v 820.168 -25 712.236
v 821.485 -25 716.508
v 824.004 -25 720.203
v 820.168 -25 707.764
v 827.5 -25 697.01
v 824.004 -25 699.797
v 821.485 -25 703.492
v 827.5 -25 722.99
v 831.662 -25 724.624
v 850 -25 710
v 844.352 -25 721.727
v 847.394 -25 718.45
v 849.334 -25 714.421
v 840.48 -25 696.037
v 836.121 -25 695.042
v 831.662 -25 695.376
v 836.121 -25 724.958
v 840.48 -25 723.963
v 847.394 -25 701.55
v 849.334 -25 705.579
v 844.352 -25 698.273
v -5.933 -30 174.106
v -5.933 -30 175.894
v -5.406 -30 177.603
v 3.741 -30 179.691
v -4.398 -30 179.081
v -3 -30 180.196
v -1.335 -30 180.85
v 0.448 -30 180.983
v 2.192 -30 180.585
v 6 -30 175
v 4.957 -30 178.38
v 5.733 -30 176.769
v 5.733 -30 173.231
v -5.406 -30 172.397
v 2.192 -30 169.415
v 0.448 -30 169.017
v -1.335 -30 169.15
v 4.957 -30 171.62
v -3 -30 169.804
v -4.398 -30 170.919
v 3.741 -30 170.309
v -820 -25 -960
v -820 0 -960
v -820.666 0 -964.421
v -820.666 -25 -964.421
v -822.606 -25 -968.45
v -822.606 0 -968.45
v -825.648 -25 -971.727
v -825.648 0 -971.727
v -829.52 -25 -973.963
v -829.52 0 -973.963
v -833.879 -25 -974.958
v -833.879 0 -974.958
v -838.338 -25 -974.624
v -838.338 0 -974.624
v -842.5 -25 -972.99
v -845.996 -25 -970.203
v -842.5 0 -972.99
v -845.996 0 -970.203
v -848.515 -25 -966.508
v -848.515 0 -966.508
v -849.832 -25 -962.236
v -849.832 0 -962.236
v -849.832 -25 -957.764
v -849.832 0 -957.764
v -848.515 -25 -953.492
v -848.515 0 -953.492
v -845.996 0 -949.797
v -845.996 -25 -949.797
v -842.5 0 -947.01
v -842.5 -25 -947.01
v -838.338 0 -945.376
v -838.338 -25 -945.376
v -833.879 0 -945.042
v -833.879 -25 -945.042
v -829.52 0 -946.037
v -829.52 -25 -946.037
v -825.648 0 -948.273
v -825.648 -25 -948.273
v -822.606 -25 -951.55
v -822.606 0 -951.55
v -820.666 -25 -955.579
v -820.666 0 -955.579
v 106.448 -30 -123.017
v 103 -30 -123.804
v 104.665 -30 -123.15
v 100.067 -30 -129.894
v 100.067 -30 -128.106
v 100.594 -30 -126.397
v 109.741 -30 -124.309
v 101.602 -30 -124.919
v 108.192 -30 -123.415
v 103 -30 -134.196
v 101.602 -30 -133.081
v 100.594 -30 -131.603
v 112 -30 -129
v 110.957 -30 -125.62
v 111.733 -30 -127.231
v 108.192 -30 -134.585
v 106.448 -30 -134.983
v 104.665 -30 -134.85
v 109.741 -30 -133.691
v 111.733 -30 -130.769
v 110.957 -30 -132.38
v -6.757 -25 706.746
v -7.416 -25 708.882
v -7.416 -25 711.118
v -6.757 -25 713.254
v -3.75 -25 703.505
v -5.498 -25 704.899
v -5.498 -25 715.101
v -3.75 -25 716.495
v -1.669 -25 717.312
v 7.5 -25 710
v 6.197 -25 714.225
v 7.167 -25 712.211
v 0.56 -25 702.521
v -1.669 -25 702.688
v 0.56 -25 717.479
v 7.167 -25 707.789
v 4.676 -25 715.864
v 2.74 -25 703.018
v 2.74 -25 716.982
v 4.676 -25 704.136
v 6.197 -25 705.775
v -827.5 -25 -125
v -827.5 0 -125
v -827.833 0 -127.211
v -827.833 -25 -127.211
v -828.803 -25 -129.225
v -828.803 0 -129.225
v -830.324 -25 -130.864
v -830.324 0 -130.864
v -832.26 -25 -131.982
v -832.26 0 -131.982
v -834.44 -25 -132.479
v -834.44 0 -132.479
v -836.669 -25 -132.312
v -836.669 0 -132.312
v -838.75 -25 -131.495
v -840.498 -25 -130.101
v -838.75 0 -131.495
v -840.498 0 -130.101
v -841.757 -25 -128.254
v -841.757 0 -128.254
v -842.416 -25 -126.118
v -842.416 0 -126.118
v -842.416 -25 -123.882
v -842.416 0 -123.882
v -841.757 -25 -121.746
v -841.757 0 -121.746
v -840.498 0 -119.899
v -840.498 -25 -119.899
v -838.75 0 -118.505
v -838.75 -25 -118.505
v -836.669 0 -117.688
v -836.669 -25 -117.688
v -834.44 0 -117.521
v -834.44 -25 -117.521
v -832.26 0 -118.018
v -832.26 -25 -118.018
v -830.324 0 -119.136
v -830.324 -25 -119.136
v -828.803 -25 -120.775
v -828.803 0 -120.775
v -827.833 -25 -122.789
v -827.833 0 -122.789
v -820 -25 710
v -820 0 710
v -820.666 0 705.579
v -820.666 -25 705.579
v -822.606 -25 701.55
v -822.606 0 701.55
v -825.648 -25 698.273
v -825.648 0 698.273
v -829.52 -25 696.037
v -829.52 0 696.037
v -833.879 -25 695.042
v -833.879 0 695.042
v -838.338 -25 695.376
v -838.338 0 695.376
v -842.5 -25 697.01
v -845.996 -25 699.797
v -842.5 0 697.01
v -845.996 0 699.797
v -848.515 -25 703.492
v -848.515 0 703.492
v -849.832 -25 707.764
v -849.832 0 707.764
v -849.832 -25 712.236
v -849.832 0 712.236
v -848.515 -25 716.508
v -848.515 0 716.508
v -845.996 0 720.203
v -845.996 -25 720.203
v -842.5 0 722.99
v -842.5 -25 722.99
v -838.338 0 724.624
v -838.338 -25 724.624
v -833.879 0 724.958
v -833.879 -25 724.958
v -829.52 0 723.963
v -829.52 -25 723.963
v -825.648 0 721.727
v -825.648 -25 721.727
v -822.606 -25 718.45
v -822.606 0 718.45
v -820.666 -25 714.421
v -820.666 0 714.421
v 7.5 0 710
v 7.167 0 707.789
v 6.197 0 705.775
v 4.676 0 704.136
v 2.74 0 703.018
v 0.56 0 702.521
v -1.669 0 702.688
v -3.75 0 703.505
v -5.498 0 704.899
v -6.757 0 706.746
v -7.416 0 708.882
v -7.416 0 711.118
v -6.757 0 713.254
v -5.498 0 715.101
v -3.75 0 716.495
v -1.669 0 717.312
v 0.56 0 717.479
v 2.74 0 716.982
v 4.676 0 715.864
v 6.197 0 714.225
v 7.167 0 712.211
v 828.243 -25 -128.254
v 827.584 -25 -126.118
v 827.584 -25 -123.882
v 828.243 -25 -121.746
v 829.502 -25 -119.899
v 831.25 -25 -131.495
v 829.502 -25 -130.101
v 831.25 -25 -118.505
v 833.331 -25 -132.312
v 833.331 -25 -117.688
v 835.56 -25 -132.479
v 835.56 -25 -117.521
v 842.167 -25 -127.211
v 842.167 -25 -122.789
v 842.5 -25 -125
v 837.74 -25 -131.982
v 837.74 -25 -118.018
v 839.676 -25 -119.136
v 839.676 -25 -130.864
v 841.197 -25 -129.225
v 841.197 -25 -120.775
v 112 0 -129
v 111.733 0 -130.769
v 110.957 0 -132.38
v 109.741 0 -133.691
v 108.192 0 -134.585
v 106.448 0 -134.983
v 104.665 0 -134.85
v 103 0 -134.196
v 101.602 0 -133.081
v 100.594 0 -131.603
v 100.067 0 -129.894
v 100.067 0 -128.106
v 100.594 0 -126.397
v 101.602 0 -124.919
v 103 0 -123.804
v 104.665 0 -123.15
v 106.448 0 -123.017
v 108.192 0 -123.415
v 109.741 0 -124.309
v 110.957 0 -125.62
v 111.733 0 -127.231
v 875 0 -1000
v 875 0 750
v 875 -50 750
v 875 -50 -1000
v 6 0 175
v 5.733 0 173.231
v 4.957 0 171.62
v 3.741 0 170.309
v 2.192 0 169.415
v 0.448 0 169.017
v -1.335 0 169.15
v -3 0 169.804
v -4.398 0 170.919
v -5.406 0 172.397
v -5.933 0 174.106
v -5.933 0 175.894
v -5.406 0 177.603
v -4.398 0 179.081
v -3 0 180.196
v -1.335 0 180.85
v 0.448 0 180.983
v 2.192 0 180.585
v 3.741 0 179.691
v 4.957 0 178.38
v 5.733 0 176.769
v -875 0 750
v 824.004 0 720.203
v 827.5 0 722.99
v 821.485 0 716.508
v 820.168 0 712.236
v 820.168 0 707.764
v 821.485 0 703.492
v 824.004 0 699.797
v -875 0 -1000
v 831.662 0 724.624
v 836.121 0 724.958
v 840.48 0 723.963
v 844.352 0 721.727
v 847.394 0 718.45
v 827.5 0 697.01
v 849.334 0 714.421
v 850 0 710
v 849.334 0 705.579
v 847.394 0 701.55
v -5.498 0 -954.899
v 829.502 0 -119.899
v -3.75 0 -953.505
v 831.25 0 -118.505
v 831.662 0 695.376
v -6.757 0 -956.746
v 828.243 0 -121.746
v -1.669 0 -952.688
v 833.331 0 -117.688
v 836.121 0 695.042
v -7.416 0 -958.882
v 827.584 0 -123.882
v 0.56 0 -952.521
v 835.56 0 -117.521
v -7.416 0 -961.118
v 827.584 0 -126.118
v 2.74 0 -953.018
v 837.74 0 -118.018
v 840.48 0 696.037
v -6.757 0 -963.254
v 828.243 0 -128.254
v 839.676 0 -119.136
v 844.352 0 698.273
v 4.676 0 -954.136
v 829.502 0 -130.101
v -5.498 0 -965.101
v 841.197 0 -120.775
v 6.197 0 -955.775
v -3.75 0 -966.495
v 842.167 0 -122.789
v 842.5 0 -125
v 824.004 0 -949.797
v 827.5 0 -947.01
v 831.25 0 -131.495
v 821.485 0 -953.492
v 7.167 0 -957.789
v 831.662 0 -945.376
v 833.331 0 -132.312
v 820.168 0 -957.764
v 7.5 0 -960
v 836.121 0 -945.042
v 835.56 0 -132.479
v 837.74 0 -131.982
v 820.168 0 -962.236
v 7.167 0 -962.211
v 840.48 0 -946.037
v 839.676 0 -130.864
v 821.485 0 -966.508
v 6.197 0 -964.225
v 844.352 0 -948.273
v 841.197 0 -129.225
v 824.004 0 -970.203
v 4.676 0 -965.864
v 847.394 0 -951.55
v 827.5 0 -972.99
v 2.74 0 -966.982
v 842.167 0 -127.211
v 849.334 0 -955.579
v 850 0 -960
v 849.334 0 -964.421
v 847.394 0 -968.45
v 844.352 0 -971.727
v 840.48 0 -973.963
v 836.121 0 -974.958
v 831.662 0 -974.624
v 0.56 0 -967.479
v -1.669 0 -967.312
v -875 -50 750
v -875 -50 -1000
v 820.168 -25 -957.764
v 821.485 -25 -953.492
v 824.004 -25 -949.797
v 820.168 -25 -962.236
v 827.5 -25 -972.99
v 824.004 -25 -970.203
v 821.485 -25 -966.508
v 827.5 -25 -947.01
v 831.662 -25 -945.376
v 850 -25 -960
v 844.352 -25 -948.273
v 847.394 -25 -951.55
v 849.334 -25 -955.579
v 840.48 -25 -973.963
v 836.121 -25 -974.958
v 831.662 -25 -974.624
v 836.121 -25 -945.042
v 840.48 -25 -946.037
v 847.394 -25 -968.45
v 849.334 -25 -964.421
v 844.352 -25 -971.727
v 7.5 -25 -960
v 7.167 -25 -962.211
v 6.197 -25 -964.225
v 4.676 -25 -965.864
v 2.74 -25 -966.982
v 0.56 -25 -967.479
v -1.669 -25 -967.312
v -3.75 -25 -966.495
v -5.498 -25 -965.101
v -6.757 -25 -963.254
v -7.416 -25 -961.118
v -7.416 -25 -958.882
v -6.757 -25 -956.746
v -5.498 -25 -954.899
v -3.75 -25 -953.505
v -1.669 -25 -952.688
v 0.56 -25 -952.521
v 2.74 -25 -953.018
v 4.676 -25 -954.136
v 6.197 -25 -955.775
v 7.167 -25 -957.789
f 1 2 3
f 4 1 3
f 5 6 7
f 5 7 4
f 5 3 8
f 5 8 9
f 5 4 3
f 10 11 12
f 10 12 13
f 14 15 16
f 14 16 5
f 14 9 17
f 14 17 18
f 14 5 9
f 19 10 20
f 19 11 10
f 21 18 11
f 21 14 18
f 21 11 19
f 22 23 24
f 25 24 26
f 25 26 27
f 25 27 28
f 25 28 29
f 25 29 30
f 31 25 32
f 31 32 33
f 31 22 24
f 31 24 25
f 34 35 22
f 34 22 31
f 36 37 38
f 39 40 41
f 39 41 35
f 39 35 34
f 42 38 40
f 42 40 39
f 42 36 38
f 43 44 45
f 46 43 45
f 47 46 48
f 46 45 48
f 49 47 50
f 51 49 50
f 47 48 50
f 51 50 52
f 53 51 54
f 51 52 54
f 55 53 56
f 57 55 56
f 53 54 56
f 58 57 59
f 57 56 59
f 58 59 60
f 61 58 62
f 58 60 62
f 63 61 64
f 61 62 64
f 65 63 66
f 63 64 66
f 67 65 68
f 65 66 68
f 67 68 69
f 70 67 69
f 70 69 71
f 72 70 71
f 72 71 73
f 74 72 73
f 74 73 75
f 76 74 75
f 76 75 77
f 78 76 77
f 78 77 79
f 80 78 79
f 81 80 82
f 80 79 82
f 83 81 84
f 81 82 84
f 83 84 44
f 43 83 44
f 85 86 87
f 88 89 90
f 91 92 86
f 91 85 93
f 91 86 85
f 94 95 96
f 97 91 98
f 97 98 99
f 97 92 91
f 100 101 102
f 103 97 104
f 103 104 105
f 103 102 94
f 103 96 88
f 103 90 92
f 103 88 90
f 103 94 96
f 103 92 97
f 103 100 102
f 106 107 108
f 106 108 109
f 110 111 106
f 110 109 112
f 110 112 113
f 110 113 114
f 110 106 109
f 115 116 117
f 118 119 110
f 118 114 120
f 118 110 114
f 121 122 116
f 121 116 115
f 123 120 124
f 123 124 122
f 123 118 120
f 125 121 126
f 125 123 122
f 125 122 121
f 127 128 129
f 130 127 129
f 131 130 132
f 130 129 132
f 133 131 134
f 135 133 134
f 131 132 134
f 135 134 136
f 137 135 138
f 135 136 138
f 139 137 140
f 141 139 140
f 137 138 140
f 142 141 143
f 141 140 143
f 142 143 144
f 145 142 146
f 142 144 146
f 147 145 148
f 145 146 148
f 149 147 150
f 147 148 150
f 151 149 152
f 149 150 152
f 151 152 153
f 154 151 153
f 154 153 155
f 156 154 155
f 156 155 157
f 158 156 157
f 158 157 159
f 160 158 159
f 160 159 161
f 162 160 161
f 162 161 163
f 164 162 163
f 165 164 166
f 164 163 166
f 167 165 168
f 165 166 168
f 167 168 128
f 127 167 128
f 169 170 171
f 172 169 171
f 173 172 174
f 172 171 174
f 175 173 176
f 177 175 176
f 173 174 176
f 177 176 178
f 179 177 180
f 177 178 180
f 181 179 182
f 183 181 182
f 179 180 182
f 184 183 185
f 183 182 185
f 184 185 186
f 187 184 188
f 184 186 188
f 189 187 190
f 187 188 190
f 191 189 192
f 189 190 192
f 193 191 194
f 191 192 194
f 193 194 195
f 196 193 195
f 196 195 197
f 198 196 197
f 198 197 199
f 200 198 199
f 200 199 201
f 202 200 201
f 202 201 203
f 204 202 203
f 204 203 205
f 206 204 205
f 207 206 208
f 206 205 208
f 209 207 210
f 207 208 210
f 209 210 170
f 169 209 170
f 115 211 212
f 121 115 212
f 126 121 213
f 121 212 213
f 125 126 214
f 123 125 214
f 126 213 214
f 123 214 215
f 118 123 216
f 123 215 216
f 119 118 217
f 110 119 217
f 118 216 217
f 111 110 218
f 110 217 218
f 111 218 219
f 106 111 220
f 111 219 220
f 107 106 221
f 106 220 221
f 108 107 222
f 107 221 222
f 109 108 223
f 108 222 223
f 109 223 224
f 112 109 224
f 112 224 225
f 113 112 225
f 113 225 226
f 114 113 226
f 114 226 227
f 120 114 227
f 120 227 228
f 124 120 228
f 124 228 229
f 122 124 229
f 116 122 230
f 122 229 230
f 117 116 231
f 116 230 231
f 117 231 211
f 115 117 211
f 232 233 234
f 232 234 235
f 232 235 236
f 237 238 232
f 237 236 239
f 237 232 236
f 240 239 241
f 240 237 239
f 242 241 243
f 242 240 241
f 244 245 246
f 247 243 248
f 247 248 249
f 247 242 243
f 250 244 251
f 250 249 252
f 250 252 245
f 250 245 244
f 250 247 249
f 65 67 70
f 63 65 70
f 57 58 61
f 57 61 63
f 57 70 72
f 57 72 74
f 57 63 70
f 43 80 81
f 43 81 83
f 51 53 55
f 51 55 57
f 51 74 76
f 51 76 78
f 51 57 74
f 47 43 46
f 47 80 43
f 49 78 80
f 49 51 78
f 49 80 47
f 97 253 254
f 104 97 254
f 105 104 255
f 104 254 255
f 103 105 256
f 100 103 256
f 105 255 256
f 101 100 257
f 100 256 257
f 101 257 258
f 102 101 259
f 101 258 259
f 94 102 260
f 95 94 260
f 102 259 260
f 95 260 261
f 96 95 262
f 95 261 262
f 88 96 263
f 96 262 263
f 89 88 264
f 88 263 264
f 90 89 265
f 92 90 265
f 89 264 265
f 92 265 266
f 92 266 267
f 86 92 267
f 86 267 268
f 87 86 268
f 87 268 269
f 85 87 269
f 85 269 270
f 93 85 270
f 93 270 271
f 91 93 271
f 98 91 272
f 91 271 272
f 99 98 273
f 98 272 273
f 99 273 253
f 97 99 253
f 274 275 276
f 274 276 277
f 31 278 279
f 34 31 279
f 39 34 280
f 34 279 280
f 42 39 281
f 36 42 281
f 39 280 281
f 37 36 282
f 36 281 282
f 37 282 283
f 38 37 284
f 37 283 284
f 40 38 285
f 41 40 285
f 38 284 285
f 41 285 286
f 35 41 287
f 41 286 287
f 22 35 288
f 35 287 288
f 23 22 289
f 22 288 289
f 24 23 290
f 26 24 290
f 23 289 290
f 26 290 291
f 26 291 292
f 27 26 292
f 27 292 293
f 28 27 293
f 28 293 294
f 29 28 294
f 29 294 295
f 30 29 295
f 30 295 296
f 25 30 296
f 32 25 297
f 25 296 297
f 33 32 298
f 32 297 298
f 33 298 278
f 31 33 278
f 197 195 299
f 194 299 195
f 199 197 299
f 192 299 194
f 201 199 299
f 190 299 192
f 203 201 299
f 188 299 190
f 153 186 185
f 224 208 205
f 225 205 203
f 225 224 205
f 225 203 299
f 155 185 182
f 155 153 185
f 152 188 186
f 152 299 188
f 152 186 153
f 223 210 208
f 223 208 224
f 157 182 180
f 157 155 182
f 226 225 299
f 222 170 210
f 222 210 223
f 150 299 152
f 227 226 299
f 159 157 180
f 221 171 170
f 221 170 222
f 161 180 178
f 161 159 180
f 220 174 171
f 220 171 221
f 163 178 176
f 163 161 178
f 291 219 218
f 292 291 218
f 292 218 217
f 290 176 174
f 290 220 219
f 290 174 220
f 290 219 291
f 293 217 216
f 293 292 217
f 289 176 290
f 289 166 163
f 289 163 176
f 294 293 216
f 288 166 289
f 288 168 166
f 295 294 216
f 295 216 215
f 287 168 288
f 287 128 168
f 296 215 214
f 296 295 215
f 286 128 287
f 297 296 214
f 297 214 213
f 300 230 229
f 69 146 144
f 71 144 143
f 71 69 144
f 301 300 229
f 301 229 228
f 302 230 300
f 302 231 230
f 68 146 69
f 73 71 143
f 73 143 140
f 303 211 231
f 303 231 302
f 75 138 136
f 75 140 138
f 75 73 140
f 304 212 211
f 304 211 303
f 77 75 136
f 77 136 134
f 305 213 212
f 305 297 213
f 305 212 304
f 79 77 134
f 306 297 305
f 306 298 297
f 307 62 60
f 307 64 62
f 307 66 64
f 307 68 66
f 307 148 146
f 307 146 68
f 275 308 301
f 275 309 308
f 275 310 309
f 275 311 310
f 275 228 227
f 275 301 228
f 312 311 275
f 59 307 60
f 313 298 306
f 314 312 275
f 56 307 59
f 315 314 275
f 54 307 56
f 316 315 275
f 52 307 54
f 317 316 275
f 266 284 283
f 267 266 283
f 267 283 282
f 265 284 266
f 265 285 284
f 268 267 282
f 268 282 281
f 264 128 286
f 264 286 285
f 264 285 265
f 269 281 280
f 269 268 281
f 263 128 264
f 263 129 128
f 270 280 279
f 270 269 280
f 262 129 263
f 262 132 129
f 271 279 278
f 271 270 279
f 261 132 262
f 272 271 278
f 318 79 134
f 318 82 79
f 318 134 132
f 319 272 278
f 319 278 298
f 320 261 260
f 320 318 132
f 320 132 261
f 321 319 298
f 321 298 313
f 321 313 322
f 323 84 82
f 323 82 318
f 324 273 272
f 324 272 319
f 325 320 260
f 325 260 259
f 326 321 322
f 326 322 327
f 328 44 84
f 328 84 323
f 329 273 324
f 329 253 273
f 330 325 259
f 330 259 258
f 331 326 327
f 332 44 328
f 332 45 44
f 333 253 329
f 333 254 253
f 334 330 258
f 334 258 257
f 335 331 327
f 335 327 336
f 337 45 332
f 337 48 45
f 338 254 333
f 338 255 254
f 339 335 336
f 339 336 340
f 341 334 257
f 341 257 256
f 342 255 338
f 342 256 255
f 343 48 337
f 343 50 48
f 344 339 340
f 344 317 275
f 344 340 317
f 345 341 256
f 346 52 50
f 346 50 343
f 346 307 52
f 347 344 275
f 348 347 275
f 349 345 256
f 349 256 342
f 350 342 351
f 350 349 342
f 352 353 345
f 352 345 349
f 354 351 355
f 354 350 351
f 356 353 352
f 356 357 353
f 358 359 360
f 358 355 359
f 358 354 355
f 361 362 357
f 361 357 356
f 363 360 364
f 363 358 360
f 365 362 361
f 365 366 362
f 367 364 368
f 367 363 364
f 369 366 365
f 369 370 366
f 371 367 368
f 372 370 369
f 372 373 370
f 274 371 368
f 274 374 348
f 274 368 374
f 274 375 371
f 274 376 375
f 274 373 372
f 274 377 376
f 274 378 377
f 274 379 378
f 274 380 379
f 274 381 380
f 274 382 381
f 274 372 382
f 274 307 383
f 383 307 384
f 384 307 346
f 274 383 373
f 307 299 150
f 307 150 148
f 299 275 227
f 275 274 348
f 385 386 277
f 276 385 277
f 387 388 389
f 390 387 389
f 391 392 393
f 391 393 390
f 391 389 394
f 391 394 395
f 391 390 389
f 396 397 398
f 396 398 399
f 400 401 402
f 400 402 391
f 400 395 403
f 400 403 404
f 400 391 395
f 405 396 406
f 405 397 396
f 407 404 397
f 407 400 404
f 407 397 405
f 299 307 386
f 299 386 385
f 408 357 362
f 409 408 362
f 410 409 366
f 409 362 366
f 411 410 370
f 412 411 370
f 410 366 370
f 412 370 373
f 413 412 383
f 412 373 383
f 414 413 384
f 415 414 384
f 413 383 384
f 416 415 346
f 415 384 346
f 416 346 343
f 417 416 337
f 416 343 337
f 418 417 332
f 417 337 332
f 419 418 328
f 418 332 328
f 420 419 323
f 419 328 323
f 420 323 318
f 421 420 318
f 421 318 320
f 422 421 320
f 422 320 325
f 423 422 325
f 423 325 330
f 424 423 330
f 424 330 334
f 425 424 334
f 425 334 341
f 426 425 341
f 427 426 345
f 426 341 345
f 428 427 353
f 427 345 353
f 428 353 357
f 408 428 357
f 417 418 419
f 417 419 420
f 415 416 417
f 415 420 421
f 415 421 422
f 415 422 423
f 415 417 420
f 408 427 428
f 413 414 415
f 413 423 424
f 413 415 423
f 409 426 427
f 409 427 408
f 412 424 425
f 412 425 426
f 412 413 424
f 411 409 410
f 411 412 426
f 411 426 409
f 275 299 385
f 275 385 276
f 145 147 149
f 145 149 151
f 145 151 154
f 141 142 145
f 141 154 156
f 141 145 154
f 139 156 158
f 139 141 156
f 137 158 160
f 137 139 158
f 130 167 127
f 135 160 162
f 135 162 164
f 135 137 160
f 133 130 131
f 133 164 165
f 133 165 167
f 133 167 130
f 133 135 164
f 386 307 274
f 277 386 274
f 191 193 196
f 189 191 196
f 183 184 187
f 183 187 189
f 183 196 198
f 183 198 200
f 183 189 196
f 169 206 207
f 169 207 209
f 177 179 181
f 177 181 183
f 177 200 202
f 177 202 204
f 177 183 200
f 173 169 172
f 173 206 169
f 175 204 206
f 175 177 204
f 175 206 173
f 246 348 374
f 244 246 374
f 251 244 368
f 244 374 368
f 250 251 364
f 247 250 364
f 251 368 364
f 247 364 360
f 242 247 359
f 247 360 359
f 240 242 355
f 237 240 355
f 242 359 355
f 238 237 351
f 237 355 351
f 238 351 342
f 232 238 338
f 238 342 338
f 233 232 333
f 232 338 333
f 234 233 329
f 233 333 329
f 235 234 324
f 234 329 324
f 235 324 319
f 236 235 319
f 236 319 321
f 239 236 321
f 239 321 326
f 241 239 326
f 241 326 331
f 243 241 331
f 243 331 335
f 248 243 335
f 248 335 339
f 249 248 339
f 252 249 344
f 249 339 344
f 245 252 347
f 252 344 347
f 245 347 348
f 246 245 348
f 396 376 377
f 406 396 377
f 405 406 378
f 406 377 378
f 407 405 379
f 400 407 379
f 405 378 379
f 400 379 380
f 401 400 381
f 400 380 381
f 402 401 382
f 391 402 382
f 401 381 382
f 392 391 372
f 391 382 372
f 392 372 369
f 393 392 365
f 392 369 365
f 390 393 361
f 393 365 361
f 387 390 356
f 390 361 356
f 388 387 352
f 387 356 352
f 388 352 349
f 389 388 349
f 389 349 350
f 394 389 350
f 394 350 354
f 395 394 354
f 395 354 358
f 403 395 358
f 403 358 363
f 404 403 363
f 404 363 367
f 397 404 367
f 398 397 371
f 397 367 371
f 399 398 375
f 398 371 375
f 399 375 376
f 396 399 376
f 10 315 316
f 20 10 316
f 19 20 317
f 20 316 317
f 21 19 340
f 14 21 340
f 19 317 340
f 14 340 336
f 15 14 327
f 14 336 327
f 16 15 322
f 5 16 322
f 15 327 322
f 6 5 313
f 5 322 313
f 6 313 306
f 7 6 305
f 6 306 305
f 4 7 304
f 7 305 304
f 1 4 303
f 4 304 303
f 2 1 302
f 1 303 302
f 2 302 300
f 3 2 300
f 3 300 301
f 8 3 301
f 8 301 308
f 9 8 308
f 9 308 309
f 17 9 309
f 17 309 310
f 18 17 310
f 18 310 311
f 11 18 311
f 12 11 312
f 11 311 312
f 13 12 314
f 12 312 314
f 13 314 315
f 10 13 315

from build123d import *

# Parameters (mm, degrees)
SKETCH1_W           = 2000
SKETCH1_H           = 2000
BOSS_EXTRUDE1_DEPTH = 50
SKETCH2_R           = 6
CUT_EXTRUDE1_DEPTH  = 30
SKETCH3_W           = 2000
SKETCH3_H           = 50
CUT_EXTRUDE2_DEPTH  = 250
SKETCH4_W           = 1750
SKETCH4_H           = 50
CUT_EXTRUDE3_DEPTH  = 125
SKETCH5_W           = 1750
SKETCH5_H           = 50
CUT_EXTRUDE4_DEPTH  = 125
SKETCH6_R           = 15
SKETCH6_R_2         = 7.5
CUT_EXTRUDE5_DEPTH  = 25


with BuildPart() as part:
    # Sketch1 → Boss-Extrude1 (new body)
    with BuildSketch(Plane(origin=(0, 0, 0), x_dir=(1, 0, 0), z_dir=(0, 1, 0))):
        Rectangle(SKETCH1_W, SKETCH1_H)
    extrude(amount=-BOSS_EXTRUDE1_DEPTH)

    # Sketch2 → Cut-Extrude1 (cut)
    with BuildSketch(Plane(origin=(0, 0, 0), x_dir=(1, 0, 0), z_dir=(0, 1, 0))):
        with Locations((0, -175)):
            Circle(SKETCH2_R)
        with Locations((106, 129)):
            Circle(SKETCH2_R)
    extrude(amount=-CUT_EXTRUDE1_DEPTH, mode=Mode.SUBTRACT)

    # Sketch3 → Cut-Extrude2 (cut)
    with BuildSketch(Plane.XY.offset(1000)):
        with Locations((0, -25)):
            Rectangle(SKETCH3_W, SKETCH3_H)
    extrude(amount=-CUT_EXTRUDE2_DEPTH, mode=Mode.SUBTRACT)

    # Sketch4 → Cut-Extrude3 (cut)
    with BuildSketch(Plane.ZY.offset(1000)):
        with Locations((-125, -25)):
            Rectangle(SKETCH4_W, SKETCH4_H)
    extrude(amount=-CUT_EXTRUDE3_DEPTH, mode=Mode.SUBTRACT)

    # Sketch5 → Cut-Extrude4 (cut)
    with BuildSketch(Plane(origin=(1000, 0, 0), x_dir=(0, 0, -1), z_dir=(1, 0, 0))):
        with Locations((125, -25)):
            Rectangle(SKETCH5_W, SKETCH5_H)
    extrude(amount=-CUT_EXTRUDE4_DEPTH, mode=Mode.SUBTRACT)

    # Sketch6 → Cut-Extrude5 (cut)
    with BuildSketch(Plane(origin=(0, 0, 0), x_dir=(1, 0, 0), z_dir=(0, 1, 0))):
        with Locations((-835, -710)):
            Circle(SKETCH6_R)
        with Locations((835, 960)):
            Circle(SKETCH6_R)
        with Locations((835, -710)):
            Circle(SKETCH6_R)
        with Locations((-835, 960)):
            Circle(SKETCH6_R)
        with Locations((0, -710)):
            Circle(SKETCH6_R_2)
        with Locations((0, 960)):
            Circle(SKETCH6_R_2)
        with Locations((-835, 125)):
            Circle(SKETCH6_R_2)
        with Locations((835, 125)):
            Circle(SKETCH6_R_2)
    extrude(amount=-CUT_EXTRUDE5_DEPTH, mode=Mode.SUBTRACT)


solid = part.part
